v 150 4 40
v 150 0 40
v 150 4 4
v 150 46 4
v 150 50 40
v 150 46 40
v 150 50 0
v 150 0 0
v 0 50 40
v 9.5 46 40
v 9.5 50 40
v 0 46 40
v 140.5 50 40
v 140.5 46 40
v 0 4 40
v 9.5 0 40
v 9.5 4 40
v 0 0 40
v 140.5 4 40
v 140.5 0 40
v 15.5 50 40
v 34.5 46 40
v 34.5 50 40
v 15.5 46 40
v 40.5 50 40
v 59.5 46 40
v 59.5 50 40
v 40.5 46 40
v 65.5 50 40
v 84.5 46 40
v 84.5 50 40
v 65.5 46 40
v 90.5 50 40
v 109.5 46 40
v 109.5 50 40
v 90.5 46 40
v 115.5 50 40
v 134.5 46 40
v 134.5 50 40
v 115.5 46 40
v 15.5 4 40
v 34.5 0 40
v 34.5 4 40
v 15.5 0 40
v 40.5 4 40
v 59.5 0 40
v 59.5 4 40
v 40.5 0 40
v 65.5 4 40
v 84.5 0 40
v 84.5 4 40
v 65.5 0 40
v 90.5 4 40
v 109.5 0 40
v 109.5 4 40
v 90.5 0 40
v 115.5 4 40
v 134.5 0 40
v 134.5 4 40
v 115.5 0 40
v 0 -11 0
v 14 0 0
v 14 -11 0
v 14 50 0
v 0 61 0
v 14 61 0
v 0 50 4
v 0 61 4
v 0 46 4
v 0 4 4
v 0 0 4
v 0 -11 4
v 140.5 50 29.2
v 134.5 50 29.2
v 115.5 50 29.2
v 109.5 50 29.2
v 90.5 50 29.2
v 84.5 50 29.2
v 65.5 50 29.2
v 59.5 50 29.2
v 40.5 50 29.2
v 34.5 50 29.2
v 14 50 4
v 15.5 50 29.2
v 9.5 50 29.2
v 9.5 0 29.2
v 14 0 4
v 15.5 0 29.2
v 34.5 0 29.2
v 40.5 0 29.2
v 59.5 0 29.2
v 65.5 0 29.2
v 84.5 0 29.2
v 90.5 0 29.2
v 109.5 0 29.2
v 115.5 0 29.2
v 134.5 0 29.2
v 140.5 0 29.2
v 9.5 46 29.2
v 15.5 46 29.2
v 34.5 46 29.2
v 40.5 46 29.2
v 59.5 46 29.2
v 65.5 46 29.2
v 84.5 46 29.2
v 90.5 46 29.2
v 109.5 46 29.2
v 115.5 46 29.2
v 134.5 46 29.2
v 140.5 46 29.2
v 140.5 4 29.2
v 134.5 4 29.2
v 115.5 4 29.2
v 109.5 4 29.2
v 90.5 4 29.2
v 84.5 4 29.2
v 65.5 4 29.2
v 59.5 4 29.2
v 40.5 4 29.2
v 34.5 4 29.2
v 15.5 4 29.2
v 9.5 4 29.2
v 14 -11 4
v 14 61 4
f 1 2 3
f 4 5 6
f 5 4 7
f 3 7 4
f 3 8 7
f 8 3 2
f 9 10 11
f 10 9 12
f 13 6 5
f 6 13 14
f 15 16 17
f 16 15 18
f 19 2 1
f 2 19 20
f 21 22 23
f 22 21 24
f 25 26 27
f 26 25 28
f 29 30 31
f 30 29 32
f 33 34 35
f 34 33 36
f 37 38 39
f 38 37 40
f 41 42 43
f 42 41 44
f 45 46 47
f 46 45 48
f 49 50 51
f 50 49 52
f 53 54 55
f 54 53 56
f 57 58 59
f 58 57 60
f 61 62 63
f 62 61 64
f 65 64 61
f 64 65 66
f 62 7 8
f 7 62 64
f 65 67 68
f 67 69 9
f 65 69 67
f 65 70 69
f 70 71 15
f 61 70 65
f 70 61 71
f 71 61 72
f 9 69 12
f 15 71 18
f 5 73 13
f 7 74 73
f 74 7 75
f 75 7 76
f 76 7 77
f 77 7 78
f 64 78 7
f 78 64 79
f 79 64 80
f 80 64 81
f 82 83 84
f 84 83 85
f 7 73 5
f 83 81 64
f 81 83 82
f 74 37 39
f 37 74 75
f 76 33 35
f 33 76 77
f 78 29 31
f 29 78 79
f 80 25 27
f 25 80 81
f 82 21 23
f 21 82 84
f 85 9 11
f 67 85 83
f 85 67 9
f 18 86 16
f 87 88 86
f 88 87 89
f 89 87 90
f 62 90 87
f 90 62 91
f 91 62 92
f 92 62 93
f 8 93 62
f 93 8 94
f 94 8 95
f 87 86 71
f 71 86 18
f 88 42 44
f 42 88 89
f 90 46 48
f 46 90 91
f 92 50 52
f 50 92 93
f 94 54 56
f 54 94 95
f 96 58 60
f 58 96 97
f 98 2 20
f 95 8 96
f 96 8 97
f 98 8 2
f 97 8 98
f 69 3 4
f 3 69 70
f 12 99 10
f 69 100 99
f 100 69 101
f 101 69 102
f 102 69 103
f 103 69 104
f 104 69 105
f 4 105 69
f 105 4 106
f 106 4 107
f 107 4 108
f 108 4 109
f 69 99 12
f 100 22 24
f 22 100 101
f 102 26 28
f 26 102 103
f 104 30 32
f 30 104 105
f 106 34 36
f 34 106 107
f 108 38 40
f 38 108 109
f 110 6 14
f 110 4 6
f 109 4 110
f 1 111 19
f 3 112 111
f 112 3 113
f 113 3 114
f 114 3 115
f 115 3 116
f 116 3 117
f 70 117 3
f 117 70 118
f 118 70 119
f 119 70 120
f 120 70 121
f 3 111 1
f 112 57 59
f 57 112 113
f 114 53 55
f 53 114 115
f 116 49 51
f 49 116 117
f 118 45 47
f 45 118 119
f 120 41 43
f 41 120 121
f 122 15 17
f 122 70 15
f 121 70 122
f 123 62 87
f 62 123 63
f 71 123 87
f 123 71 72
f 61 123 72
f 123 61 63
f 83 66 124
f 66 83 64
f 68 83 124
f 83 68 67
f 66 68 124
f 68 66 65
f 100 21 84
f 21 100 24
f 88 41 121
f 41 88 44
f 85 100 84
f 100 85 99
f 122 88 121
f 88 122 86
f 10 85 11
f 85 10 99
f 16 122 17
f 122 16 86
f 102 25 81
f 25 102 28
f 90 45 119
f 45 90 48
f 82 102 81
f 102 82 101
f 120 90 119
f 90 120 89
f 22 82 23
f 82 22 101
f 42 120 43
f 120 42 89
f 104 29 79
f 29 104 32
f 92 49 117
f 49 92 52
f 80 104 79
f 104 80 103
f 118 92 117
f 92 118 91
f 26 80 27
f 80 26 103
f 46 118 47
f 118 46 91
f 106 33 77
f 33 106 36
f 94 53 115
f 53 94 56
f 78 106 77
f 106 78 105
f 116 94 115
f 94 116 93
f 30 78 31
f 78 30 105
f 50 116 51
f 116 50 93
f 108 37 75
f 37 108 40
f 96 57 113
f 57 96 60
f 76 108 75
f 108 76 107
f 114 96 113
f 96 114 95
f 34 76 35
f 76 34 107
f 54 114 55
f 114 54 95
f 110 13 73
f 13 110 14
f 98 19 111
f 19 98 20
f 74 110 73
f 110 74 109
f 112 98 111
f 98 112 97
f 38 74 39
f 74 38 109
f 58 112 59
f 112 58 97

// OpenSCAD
$fn = 32;

// ----------------------------------------------------------------------
// Cable duct: 150 x 50 x 40 mm, 6 fingers
// ----------------------------------------------------------------------

// --- parameters (mm) ---
tray_len = 150;           // duct length, X
tray_w = 50;              // duct width, Y
tray_h = 40;              // duct height, Z
tray_t = 4;               // side wall thickness
floor_t = 4;              // floor thickness
slot_w = 6;               // finger slot width
slot_h = 25.2;            // finger slot height
fingers = 6;              // number of finger slots per side
pitch = 25;               // finger pitch
ear_w = 12;               // mounting ear width
ear_l = 14;               // mounting ear length

module shell() {
  difference() {
    cube([tray_len, tray_w, tray_h]);
    /* open top channel */
    translate([-tray_t - 1, tray_t, floor_t])
      cube([tray_len + 2 * tray_t + 2, tray_w - 2 * tray_t, tray_h + 1]);
  }
}

module ears() {
  translate([0, -ear_w + 1, 0]) cube([ear_l, ear_w, floor_t]);
  translate([0, tray_w - 1, 0]) cube([ear_l, ear_w, floor_t]);
}

difference() {
  union() {
    shell();
    ears();
  }
  /* finger slots cut through both side walls */
  for (i = [0 : fingers - 1]) translate([pitch / 2 + i * pitch - slot_w / 2, -1, floor_t + slot_h]) cube([slot_w, tray_w + 2, tray_h]);
}
